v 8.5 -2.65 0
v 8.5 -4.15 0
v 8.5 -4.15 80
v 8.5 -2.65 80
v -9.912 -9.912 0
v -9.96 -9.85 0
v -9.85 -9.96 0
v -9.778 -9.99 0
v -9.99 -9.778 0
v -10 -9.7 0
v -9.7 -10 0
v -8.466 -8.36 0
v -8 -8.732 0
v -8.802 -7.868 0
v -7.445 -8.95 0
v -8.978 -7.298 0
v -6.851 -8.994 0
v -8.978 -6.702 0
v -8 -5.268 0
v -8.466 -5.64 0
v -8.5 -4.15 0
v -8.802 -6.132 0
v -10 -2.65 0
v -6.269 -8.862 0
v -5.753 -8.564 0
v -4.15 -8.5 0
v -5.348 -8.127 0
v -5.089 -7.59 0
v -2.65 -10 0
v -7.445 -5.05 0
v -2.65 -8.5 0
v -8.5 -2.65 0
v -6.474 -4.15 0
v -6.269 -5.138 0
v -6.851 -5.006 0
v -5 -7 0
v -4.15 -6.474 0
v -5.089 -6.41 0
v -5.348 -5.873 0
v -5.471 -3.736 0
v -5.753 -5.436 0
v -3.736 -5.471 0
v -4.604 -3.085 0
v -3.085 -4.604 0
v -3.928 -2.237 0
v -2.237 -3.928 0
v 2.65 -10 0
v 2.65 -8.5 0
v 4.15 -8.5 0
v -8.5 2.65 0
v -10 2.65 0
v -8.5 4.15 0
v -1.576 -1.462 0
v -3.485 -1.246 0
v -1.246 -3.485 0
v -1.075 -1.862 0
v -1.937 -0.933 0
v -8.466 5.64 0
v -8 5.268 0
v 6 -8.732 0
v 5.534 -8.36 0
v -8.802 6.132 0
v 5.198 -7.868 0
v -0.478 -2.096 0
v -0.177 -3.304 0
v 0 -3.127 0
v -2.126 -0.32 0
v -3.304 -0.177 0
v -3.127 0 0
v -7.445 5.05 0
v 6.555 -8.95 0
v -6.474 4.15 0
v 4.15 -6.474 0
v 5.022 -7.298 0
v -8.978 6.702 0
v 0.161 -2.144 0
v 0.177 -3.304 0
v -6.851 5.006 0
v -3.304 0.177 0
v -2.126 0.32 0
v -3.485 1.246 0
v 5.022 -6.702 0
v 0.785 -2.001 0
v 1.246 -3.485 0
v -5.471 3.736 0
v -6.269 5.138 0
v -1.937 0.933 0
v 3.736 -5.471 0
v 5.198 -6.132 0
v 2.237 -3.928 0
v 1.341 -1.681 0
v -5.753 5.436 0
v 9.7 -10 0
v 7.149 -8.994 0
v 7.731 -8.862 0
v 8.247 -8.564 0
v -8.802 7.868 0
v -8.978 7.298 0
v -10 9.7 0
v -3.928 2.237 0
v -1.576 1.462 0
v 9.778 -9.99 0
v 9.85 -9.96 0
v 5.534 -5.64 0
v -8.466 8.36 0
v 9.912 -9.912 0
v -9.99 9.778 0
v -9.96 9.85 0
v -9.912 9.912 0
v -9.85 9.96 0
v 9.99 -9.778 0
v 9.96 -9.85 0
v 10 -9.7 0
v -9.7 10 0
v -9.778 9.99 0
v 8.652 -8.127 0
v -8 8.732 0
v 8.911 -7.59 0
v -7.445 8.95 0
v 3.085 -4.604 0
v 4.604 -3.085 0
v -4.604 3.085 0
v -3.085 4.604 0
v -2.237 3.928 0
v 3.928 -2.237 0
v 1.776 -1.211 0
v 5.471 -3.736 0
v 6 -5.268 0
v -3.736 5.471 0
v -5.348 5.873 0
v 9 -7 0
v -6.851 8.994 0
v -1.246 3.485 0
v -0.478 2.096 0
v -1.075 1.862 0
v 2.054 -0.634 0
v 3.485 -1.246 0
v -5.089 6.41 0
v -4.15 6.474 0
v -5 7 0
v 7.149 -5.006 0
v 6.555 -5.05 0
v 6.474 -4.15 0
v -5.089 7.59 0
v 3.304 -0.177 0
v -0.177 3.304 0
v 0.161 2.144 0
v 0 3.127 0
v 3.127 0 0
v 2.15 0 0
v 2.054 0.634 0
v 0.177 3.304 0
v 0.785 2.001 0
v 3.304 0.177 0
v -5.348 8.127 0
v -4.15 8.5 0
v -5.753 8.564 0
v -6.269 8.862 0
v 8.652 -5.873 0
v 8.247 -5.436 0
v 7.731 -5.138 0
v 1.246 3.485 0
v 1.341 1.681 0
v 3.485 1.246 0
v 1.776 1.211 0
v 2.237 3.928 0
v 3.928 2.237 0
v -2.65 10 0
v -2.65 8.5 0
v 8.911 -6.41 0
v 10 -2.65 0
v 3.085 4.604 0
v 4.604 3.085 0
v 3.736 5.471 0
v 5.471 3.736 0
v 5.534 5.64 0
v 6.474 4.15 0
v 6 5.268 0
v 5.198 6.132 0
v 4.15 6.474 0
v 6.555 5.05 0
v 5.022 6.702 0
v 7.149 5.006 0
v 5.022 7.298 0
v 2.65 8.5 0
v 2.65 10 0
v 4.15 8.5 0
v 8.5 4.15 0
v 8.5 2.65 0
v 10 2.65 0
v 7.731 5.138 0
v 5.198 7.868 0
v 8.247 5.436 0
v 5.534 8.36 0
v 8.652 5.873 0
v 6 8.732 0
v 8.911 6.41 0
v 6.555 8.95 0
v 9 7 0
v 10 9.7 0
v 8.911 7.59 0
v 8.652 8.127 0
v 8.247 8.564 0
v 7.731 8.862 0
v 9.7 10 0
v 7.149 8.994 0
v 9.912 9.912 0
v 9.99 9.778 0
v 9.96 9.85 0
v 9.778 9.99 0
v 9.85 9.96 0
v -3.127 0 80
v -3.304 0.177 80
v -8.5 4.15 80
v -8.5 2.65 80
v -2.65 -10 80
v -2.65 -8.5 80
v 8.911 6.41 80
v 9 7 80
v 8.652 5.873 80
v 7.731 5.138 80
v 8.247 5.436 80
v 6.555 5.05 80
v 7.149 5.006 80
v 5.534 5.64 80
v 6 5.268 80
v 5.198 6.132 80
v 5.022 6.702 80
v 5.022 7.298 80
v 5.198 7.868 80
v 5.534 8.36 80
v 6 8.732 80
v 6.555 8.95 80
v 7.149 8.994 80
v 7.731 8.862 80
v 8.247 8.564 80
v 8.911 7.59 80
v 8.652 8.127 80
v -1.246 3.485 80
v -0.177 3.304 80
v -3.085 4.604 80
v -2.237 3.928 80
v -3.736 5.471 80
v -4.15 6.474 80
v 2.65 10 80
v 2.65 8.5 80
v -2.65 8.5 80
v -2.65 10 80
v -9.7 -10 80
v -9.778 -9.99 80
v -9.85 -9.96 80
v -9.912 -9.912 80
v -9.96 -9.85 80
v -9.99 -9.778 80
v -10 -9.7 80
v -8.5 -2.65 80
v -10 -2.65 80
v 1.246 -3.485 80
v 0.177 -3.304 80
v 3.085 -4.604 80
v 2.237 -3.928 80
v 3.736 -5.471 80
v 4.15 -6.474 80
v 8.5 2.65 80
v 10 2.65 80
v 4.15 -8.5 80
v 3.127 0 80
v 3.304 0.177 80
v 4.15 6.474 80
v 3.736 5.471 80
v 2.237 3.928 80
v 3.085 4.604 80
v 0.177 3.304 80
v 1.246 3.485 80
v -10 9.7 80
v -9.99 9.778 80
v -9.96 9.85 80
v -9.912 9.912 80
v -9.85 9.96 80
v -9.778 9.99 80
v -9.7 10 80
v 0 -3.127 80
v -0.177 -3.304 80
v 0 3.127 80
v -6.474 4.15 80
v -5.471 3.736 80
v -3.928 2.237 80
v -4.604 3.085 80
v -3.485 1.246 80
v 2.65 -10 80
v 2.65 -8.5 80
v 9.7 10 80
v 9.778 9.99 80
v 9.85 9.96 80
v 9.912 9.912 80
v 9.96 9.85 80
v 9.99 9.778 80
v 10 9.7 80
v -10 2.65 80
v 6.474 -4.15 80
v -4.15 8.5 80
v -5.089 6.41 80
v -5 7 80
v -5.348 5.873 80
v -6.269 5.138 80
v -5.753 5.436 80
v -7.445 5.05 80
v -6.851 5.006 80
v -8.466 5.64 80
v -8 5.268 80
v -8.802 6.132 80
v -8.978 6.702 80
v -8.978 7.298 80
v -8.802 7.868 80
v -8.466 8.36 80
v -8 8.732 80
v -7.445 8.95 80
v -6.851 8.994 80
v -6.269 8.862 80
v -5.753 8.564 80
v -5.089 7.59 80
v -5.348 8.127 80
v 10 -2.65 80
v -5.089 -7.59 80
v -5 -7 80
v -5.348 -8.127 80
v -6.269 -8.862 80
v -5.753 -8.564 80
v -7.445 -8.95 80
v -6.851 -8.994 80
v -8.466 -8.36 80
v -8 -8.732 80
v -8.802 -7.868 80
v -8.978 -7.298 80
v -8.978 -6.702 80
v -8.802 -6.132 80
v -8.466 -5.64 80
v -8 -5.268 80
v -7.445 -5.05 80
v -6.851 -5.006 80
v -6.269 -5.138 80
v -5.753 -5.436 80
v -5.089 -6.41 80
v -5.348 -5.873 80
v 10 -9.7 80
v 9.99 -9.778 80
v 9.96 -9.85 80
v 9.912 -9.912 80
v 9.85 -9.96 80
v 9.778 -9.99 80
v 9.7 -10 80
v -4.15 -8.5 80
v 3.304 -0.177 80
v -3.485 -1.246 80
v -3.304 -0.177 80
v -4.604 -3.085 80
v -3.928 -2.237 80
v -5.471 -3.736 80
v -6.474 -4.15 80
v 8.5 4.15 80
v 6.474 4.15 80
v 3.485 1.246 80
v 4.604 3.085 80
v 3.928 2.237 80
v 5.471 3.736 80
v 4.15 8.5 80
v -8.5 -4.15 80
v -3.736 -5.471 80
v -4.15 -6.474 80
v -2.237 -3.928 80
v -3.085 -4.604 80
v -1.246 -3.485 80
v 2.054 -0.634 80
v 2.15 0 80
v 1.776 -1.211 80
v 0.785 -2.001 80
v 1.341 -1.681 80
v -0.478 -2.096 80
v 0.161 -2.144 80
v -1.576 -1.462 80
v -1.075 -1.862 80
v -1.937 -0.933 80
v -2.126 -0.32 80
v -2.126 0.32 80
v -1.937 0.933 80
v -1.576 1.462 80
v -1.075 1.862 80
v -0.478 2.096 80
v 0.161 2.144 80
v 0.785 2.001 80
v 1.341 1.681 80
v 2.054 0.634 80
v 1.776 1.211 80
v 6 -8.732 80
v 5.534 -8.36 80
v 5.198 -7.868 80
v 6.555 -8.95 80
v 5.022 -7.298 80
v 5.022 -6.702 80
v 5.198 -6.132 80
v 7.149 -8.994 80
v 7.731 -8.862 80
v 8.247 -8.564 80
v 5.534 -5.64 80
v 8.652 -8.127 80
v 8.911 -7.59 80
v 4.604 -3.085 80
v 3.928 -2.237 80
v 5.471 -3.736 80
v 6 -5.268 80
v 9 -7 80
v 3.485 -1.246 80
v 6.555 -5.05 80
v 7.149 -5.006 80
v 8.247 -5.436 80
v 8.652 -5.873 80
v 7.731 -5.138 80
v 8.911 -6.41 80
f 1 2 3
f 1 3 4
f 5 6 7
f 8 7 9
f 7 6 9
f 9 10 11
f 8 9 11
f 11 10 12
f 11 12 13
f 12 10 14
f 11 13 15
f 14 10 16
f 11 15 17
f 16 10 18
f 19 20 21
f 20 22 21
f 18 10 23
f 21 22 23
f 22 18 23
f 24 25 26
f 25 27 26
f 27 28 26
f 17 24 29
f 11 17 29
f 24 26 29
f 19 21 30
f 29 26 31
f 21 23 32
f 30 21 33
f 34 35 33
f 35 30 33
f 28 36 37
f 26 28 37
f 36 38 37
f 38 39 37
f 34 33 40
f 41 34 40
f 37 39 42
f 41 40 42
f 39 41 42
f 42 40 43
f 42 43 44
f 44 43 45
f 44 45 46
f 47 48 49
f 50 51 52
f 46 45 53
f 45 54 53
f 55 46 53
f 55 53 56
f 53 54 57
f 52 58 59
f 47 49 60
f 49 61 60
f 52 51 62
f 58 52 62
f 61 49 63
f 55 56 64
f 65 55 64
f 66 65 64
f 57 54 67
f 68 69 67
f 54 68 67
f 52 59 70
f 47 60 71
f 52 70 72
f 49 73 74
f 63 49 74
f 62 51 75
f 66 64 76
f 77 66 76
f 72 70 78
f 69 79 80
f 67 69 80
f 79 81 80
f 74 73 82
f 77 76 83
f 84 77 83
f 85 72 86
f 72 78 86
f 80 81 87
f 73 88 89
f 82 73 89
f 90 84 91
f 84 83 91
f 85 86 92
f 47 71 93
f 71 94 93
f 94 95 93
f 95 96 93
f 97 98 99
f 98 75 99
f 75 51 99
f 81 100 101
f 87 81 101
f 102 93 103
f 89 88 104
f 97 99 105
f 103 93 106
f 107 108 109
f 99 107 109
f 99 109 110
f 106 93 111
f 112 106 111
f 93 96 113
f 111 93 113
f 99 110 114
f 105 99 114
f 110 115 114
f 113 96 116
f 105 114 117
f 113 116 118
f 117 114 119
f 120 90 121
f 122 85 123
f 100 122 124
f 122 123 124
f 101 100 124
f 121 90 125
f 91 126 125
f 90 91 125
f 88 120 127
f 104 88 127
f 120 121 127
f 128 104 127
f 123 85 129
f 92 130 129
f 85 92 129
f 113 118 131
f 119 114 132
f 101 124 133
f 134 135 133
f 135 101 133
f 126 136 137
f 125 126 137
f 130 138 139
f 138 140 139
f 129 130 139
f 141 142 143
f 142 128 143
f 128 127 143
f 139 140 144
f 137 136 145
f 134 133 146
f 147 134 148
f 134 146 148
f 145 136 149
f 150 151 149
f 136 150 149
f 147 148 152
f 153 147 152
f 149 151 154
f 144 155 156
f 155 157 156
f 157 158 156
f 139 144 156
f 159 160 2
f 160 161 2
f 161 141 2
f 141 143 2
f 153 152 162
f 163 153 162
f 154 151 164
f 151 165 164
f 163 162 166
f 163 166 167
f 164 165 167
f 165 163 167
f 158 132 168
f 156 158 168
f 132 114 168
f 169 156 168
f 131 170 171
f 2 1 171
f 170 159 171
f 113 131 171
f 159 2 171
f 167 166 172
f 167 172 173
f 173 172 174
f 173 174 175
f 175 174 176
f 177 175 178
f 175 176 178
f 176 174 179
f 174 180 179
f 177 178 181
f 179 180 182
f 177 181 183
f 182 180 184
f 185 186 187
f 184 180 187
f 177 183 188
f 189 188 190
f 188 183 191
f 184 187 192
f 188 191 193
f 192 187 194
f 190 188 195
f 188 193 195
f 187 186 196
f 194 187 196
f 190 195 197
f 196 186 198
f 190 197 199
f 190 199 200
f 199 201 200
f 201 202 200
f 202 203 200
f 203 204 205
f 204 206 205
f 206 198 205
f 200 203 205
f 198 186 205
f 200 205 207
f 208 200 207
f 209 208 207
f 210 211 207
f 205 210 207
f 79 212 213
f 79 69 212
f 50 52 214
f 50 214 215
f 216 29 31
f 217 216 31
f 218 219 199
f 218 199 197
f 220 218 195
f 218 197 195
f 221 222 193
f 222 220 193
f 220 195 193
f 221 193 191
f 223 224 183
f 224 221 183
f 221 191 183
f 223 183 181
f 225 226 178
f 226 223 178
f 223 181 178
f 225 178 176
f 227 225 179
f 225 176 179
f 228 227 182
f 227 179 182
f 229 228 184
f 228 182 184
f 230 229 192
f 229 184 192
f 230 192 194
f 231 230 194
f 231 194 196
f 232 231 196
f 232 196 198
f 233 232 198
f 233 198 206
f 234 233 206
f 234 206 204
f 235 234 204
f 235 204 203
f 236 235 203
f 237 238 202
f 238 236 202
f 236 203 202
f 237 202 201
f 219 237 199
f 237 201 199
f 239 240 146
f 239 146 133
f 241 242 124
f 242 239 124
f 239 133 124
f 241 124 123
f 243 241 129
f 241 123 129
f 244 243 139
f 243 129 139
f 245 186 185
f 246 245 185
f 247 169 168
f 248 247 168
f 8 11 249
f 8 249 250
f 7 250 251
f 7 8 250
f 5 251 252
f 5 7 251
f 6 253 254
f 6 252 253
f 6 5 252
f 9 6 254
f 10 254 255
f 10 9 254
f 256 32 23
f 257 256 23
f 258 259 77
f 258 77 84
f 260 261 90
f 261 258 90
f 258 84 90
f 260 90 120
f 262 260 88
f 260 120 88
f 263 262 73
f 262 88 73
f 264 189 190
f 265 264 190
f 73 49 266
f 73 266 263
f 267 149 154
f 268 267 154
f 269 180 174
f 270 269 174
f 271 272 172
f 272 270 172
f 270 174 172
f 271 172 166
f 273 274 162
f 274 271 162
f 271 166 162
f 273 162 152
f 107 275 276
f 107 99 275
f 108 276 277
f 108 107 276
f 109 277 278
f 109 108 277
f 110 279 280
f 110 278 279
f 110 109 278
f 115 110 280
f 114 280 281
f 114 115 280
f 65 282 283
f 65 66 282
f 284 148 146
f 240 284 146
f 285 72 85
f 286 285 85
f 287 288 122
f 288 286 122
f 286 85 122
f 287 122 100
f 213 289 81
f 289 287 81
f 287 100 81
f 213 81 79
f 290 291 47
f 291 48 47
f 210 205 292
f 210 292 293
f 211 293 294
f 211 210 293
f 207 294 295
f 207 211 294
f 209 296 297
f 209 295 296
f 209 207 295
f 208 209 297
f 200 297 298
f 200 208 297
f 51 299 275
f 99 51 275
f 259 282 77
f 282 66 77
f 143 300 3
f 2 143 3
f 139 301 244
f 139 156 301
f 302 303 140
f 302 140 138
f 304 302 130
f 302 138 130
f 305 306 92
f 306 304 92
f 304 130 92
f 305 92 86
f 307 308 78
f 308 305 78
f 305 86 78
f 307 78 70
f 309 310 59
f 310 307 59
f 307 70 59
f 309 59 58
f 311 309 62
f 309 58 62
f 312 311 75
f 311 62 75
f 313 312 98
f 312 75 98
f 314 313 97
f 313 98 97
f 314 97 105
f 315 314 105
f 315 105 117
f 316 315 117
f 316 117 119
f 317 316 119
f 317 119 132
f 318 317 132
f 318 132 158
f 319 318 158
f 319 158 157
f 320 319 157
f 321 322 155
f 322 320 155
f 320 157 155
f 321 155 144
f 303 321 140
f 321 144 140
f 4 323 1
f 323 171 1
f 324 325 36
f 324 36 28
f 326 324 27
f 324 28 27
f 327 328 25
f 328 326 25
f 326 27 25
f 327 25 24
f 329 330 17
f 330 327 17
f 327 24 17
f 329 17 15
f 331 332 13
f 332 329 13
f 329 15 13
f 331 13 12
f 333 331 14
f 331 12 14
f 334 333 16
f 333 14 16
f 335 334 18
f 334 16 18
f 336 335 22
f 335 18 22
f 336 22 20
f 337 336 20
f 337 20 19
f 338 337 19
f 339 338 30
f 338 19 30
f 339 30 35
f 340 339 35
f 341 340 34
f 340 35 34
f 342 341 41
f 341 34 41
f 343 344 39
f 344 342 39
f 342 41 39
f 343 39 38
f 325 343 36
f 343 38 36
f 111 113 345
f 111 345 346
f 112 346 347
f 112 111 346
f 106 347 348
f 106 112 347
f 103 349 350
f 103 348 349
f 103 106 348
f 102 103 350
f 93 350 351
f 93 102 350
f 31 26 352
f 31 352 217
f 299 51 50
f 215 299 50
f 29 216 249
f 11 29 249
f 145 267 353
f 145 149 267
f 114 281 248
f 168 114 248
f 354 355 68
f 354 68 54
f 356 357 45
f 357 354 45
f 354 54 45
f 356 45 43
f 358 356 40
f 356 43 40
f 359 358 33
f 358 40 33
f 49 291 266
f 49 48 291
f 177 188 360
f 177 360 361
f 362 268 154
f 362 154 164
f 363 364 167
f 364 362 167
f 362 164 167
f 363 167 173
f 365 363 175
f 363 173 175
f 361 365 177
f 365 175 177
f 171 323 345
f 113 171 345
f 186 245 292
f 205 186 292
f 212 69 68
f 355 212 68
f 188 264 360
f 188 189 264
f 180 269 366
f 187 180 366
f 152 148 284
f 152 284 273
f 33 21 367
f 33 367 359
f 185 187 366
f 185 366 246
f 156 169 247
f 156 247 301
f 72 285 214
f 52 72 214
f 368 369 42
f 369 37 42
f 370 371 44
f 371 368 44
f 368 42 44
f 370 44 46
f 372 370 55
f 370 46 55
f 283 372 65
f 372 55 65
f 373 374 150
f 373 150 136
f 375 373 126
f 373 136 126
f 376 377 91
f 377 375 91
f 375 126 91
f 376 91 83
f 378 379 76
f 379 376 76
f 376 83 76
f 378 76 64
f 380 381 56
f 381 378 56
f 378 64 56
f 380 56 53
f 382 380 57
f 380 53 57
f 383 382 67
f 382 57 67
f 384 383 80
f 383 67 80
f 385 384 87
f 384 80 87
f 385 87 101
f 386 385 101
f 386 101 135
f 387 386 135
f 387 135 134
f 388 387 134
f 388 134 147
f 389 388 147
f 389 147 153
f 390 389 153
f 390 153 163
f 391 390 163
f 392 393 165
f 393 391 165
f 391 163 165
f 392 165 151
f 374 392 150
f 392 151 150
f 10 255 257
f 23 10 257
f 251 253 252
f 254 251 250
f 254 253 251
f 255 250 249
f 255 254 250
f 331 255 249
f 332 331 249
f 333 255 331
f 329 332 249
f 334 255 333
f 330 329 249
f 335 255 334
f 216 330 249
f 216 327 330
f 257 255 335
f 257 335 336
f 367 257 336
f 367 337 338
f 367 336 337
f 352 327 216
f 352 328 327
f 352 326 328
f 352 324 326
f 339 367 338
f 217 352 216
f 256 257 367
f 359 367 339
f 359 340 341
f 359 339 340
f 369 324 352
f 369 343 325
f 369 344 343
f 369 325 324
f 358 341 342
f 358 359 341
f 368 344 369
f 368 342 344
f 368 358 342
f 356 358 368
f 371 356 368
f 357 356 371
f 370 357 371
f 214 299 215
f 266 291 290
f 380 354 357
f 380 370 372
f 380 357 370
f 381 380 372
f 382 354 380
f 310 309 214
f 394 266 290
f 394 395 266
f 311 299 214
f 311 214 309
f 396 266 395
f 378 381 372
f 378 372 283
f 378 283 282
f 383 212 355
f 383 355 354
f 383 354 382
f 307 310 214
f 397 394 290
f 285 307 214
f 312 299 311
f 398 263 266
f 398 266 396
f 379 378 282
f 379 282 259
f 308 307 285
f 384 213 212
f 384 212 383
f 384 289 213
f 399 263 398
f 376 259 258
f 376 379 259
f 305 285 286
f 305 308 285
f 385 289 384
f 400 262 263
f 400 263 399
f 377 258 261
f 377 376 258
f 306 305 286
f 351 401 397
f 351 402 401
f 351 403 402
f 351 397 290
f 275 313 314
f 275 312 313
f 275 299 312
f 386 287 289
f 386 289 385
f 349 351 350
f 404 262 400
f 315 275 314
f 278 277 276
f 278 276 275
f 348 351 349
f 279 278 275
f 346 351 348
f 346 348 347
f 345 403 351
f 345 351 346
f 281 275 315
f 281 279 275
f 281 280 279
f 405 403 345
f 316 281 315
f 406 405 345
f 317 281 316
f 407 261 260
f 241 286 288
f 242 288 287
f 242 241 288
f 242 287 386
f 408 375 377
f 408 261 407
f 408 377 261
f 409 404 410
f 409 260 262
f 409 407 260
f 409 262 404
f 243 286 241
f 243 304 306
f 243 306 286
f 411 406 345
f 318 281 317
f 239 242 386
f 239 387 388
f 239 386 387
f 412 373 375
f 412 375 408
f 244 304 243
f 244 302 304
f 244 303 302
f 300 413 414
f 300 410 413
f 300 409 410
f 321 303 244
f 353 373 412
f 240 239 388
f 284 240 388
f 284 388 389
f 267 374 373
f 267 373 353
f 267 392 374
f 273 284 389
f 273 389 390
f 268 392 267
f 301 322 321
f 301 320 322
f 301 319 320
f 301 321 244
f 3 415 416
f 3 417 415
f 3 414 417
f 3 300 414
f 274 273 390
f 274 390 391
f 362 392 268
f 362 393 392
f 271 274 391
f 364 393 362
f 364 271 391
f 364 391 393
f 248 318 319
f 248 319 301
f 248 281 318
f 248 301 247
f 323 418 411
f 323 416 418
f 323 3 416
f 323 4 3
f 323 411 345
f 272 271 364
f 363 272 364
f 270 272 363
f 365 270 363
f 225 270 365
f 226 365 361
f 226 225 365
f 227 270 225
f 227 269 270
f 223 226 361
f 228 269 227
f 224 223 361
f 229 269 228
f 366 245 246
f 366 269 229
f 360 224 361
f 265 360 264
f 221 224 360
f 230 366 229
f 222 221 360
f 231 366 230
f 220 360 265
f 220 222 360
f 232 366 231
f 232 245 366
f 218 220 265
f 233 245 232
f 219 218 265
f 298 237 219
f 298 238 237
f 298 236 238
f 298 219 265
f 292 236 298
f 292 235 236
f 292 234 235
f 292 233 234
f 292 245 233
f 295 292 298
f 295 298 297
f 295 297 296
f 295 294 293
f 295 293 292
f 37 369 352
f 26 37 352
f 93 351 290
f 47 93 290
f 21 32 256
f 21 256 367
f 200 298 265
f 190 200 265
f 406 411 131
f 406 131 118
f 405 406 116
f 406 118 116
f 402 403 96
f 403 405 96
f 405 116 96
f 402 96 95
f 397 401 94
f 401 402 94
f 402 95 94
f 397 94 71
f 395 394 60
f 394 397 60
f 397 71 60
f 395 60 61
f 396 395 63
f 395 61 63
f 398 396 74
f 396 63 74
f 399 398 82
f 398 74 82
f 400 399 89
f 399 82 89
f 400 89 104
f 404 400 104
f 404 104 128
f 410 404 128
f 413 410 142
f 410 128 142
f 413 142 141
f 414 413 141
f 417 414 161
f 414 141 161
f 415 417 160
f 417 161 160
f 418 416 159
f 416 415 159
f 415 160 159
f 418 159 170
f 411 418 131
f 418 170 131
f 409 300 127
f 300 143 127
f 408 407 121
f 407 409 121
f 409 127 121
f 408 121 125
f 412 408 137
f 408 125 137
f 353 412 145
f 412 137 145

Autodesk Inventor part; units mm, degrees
ref_plane "YZ Plane" through (0, 0, 0) normal (1, 0, 0) x (0, 1, 0)
ref_plane "XZ Plane" through (0, 0, 0) normal (0, 1, 0) x (-1, 0, 0)
ref_plane "XY Plane" through (0, 0, 0) normal (0, 0, 1) x (1, 0, 0)
sketch "스케치1" plane through (0, 0, 0) normal (0, 0, 1) x (1, 0, 0)
  line L0 (9.7, -10) -> (-9.7, -10)
  line L1 (-10, -9.7) -> (-10, 9.7)
  line L2 (-9.7, 10) -> (9.7, 10)
  line L3 (10, 9.7) -> (10, -9.7)
  line L4 (10, -10) -> (-10, 10) construction
  line L5 (-10, -10) -> (10, 10) construction
  line L6 (7, -7) -> (-7, -7) construction
  line L7 (-7, -7) -> (-7, 7) construction
  line L8 (-7, 7) -> (7, 7) construction
  line L9 (7, 7) -> (7, -7) construction
  line L10 (7, -7) -> (-7, 7) construction
  line L11 (-7, -7) -> (7, 7) construction
  circle A0 centre (-7, 7) radius 2
  circle A1 centre (0, 0) radius 2.15
  arc A2 (9.7, -10) -> (10, -9.7) centre (9.7, -9.7) ccw
  arc A3 (-10, -9.7) -> (-9.7, -10) centre (-9.7, -9.7) ccw
  arc A4 (-9.7, 10) -> (-10, 9.7) centre (-9.7, 9.7) ccw
  arc A5 (10, 9.7) -> (9.7, 10) centre (9.7, 9.7) ccw
  line L12 (0, 10) -> (0, -10) construction
  line L13 (10, 0) -> (-10, 0) construction
  line L14 (2.65, -10) -> (-2.65, -10)
  line L15 (-2.65, -10) -> (-2.65, -8.5)
  line L16 (-2.65, -8.5) -> (2.65, -8.5)
  line L17 (2.65, -8.5) -> (2.65, -10)
  line L18 (4.15, -3.3) -> (-4.15, -3.3) construction
  line L19 (-4.15, -3.3) -> (-4.15, -8.5) construction
  line L20 (-4.15, -8.5) -> (4.15, -8.5)
  line L21 (4.15, -8.5) -> (4.15, -3.3) construction
  arc A6 (4.15, -6.4742) -> (-4.15, -6.4742) centre (0, -7.6) ccw
  line L22 (42.9153, -82.9009) -> (54.7664, -82.9009) construction
  line L23 (54.7664, -82.9009) -> (54.7664, -95.6544) construction
  line L24 (54.7664, -95.6544) -> (42.9153, -95.6544) construction
  line L25 (42.9153, -95.6544) -> (42.9153, -82.9009) construction
  arc A7 (44.9755, -91.1725) -> (50.2986, -91.1614) centre (47.6297, -87.6532) ccw
  line L26 (0, -3.1269) -> (-0.1768, -3.3036)
  line L27 (0, -3.1269) -> (0, -3.3) construction
  line L28 (0, -3.1269) -> (0.1731, -3.1269) construction
  line L29 (47.4573, -92.1078) -> (47.6389, -92.3063)
  line L30 (0, -3.1269) -> (0.1768, -3.3036)
  line L31 (-4.15, -6.4742) -> (-4.15, -8.5)
  line L32 (4.15, -8.5) -> (4.15, -6.4742)
  arc A8 (6.4742, 4.15) -> (6.4742, -4.15) centre (7.6, 0) ccw
  line L33 (8.5, 4.15) -> (6.4742, 4.15)
  line L34 (3.3, -4.15) -> (8.5, -4.15) construction
  line L35 (6.4742, -4.15) -> (8.5, -4.15)
  line L36 (8.5, -4.15) -> (8.5, 4.15)
  line L37 (10, -2.65) -> (8.5, -2.65)
  line L38 (8.5, 2.65) -> (10, 2.65)
  line L39 (3.1269, 0) -> (3.3036, -0.1768)
  line L40 (3.1269, 0) -> (3.3036, 0.1768)
  arc A9 (-4.15, 6.4742) -> (4.15, 6.4742) centre (0, 7.6) ccw
  line L41 (-4.15, 8.5) -> (-4.15, 6.4742)
  line L42 (4.15, 3.3) -> (4.15, 8.5) construction
  line L43 (4.15, 6.4742) -> (4.15, 8.5)
  line L44 (4.15, 8.5) -> (-4.15, 8.5)
  line L45 (2.65, 10) -> (2.65, 8.5)
  line L46 (-2.65, 8.5) -> (-2.65, 10)
  line L47 (0, 3.1269) -> (0.1768, 3.3036)
  line L48 (0, 3.1269) -> (-0.1768, 3.3036)
  arc A10 (-6.4742, -4.15) -> (-6.4742, 4.15) centre (-7.6, 0) ccw
  line L49 (-8.5, -4.15) -> (-6.4742, -4.15)
  line L50 (-3.3, 4.15) -> (-8.5, 4.15) construction
  line L51 (-6.4742, 4.15) -> (-8.5, 4.15)
  line L52 (-8.5, 4.15) -> (-8.5, -4.15)
  line L53 (-10, 2.65) -> (-8.5, 2.65)
  line L54 (-8.5, -2.65) -> (-10, -2.65)
  line L55 (-3.1269, 0) -> (-3.3036, 0.1768)
  line L56 (-3.1269, 0) -> (-3.3036, -0.1768)
  circle A11 centre (-7, -7) radius 2
  circle A12 centre (7, -7) radius 2
  circle A13 centre (7, 7) radius 2
  point P0 (3.3, 0)
  point P1 (0, 3.3)
  point P2 (-3.3, 0)
  point P3 (6.4742, -4.15)
  point P4 (4.15, 6.4742)
  point P5 (-6.4742, 4.15)
  point P6 (-4.15, -6.4742)
  dimension "d0" = 20
  dimension "d1" = 20
  dimension "d2" = 14
  dimension "d3" = 14
  dimension "d4" = 4
  dimension "d5" = 4.3
  dimension "d6" = 0.3
  dimension "d7" = 5.3
  dimension "d8" = 1.5
  dimension "d9" = 6.7
  dimension "d10" = 8.3
  dimension "d11" = 4.3
  dimension "d28" = 0.25
  dimension "d30" = 90
  dimension "d37" = 45
  dimension "d41" = 360
  dimension "d48" = 360
extrude "돌출1" add sketch "스케치1" along normal blind 80 contours L0 L17 L20 L32 A6 L30 L26 L31 L15 A3 L1 L54 L52 L49 A10 L56 L55 L51 L53 A4 L2 L46 L44 L41 A9 L48 L47 L43 L45 A5 L3 L38 L36 L33 A8 L40 L39 L35 L37 A2
properties part number "SAFRS-P-0014"
